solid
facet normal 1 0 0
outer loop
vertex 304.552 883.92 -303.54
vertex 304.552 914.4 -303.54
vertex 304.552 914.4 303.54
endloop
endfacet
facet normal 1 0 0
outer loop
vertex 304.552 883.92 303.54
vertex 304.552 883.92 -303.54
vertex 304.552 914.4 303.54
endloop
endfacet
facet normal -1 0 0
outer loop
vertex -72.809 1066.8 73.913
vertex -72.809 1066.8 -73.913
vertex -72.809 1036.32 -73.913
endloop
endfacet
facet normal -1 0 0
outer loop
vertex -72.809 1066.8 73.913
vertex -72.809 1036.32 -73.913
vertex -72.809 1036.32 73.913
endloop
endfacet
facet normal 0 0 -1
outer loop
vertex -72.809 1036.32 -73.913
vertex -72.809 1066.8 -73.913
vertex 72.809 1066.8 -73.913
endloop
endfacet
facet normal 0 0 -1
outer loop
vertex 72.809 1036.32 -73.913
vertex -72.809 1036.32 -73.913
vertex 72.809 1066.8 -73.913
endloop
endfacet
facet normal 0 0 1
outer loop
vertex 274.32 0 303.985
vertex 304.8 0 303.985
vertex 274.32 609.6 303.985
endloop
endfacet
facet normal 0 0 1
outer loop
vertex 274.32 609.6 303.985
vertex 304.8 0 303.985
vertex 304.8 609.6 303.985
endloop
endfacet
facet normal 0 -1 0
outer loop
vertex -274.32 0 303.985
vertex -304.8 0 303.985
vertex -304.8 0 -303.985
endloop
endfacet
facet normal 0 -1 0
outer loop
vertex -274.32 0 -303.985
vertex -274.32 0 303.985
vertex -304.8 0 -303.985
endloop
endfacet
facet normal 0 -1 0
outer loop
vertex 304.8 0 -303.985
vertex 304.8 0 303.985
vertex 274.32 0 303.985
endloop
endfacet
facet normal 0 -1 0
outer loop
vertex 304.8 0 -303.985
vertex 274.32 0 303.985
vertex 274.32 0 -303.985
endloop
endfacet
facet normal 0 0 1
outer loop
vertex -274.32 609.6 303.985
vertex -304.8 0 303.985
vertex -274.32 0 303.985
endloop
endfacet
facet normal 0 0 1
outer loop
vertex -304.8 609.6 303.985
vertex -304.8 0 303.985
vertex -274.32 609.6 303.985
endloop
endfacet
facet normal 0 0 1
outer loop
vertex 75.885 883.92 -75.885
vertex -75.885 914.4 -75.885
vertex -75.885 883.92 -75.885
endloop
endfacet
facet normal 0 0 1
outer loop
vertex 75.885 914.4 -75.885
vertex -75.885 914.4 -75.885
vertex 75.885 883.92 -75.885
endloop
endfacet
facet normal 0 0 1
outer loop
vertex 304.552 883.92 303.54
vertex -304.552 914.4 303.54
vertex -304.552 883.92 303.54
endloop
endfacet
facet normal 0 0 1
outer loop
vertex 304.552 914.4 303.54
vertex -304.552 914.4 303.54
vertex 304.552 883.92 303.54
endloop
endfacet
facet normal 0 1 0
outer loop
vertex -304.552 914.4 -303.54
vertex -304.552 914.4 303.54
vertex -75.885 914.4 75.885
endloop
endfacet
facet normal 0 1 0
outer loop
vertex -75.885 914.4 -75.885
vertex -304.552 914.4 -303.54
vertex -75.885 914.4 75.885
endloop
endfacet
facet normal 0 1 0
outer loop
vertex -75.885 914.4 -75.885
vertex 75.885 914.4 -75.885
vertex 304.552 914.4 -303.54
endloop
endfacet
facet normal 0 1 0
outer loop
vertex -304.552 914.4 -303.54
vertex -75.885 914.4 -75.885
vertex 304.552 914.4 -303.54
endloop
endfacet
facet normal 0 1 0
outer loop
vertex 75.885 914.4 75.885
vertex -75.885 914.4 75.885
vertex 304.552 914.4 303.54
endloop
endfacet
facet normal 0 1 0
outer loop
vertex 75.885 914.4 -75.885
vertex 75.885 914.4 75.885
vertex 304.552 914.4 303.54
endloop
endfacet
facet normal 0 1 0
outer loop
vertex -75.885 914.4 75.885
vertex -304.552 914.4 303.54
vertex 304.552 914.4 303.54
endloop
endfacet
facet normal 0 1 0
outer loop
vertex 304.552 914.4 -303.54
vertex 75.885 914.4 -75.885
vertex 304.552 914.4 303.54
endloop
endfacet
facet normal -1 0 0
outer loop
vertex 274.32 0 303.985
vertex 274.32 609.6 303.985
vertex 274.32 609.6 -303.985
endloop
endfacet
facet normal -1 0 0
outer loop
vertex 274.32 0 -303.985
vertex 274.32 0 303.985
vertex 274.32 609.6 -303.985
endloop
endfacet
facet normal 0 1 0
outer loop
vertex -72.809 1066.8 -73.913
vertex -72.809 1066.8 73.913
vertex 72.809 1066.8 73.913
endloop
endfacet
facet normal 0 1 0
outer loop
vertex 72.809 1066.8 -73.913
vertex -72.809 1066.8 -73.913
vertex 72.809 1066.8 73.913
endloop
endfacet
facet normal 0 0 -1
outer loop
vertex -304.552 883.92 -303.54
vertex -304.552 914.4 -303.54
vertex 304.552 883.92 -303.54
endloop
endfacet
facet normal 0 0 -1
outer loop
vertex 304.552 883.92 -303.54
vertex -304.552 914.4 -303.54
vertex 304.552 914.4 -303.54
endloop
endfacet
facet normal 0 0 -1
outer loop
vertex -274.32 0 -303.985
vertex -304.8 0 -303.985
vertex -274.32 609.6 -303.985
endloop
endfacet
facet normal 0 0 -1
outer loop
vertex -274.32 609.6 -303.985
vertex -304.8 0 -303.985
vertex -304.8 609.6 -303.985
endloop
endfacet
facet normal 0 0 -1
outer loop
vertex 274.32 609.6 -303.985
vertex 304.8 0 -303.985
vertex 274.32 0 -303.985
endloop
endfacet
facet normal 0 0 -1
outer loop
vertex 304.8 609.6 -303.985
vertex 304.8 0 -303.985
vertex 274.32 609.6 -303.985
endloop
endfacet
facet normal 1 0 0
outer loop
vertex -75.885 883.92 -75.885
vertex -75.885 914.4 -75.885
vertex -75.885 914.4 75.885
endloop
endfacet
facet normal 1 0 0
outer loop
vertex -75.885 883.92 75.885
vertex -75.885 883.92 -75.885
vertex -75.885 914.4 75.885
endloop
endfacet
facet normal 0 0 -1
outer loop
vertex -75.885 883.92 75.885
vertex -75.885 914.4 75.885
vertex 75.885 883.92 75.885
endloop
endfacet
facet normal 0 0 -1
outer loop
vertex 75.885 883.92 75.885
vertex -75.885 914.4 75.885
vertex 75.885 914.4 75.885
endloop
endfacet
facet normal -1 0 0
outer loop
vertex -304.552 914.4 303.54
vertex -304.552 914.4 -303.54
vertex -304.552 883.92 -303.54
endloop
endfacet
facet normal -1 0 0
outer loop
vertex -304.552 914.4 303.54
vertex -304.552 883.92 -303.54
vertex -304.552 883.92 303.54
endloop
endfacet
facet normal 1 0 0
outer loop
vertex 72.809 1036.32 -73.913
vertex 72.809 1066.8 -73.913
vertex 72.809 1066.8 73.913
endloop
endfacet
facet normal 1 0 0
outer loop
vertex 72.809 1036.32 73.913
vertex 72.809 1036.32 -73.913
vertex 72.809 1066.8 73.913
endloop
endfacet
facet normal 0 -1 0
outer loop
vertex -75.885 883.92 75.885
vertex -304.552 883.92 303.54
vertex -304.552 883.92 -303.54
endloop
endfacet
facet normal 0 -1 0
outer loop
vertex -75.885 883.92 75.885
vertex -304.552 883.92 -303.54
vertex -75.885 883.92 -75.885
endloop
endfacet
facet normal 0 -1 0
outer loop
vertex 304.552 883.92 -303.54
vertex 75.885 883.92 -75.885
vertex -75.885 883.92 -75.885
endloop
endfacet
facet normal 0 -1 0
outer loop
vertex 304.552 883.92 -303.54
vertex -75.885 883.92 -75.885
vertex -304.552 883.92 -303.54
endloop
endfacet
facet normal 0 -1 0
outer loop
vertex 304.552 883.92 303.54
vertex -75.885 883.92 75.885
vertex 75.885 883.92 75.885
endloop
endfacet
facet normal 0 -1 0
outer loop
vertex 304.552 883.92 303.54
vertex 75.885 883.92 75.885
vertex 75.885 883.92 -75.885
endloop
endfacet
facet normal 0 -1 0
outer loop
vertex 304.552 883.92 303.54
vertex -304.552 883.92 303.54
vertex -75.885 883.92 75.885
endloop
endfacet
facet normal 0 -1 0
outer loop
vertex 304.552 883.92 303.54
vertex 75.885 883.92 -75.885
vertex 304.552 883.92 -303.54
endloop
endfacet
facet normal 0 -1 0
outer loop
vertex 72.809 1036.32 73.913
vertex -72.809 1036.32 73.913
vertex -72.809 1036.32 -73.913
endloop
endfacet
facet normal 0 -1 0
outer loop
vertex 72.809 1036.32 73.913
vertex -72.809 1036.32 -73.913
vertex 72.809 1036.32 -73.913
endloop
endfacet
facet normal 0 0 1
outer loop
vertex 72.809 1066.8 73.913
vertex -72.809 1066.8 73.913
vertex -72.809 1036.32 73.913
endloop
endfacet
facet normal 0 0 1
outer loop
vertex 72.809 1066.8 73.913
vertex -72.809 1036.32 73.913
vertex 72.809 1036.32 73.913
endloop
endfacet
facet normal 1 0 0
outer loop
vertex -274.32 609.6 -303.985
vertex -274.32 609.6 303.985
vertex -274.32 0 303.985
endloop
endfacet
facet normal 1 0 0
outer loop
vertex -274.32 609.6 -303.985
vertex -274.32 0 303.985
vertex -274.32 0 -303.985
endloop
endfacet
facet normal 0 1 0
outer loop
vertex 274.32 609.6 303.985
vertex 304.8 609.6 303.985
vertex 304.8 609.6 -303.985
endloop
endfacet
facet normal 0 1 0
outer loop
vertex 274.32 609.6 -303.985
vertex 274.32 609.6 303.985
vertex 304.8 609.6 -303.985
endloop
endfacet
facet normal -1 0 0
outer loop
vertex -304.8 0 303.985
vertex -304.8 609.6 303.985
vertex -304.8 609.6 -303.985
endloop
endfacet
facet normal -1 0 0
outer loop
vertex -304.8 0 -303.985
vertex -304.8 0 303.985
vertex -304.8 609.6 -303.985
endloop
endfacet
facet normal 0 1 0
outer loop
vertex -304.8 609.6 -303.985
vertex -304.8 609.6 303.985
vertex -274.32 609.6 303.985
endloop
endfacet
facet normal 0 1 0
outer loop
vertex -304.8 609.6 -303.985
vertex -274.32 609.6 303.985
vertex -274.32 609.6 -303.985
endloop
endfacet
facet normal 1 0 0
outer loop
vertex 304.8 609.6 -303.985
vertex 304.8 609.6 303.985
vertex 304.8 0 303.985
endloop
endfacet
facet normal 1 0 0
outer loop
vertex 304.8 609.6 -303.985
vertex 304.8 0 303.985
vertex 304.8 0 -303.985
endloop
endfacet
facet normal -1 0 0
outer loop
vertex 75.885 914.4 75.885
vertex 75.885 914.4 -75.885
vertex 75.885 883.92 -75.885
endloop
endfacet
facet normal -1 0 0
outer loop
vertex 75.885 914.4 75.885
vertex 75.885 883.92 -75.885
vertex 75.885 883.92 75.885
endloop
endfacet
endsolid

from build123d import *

# Parameters (mm, degrees)
F3_W      = 609.1041564941
F3_H      = 607.0808172226
F3_W_2    = 151.7698764801
F3_H_2    = 151.7701148987
F4_DEPTH  = 30.48
F1_E10_W  = 607.9699874166
F1_E10_H  = 609.6
F8_DEPTH  = 30.48
F11_W     = 145.6189155579
F11_H     = 147.8253602982
F12_DEPTH = 30.48


# Not quite as in the source:
# - a feature of the source that left no trace in its solid (it failed there, or was rolled back) is left out
# - a pattern or mirror of a feature is missing from the dataset's text; its kind, count and spacing are read off the source's solid
# - the program builds the solid bodies; features that only make, move or delete a surface that nothing else refers to are left out


with BuildPart() as f4:
    # F3 (on offset) → F4 (new body)
    with BuildSketch(Plane.XZ.offset(-914.4)):
        Rectangle(F3_W, F3_H)
        Rectangle(F3_W_2, F3_H_2, mode=Mode.SUBTRACT)
    extrude(amount=F4_DEPTH)


with BuildPart() as f8:
    # F1_E10 (on explicit) → F8 (new body)
    with BuildSketch(Plane(origin=(-304.8, 0, 303.9849937083), x_dir=(0, 0, -1), z_dir=(1, 0, 0))):
        with Locations((303.9849937083, 304.8)):
            Rectangle(F1_E10_W, F1_E10_H)
    extrude(amount=F8_DEPTH)


with BuildPart() as f8_copies_1:
    # F8_copies: instance of F8
    add(f8.part.mirror(Plane(origin=(0, 0, 0), x_dir=(0, 0, 1), z_dir=(1, 0, 0))))


with BuildPart() as f12:
    # F11 (on offset) → F12 (new body)
    with BuildSketch(Plane.XZ.offset(-1066.8)):
        Rectangle(F11_W, F11_H)
    extrude(amount=F12_DEPTH)


solid = Compound([f4.part, f8.part, f8_copies_1.part, f12.part])
